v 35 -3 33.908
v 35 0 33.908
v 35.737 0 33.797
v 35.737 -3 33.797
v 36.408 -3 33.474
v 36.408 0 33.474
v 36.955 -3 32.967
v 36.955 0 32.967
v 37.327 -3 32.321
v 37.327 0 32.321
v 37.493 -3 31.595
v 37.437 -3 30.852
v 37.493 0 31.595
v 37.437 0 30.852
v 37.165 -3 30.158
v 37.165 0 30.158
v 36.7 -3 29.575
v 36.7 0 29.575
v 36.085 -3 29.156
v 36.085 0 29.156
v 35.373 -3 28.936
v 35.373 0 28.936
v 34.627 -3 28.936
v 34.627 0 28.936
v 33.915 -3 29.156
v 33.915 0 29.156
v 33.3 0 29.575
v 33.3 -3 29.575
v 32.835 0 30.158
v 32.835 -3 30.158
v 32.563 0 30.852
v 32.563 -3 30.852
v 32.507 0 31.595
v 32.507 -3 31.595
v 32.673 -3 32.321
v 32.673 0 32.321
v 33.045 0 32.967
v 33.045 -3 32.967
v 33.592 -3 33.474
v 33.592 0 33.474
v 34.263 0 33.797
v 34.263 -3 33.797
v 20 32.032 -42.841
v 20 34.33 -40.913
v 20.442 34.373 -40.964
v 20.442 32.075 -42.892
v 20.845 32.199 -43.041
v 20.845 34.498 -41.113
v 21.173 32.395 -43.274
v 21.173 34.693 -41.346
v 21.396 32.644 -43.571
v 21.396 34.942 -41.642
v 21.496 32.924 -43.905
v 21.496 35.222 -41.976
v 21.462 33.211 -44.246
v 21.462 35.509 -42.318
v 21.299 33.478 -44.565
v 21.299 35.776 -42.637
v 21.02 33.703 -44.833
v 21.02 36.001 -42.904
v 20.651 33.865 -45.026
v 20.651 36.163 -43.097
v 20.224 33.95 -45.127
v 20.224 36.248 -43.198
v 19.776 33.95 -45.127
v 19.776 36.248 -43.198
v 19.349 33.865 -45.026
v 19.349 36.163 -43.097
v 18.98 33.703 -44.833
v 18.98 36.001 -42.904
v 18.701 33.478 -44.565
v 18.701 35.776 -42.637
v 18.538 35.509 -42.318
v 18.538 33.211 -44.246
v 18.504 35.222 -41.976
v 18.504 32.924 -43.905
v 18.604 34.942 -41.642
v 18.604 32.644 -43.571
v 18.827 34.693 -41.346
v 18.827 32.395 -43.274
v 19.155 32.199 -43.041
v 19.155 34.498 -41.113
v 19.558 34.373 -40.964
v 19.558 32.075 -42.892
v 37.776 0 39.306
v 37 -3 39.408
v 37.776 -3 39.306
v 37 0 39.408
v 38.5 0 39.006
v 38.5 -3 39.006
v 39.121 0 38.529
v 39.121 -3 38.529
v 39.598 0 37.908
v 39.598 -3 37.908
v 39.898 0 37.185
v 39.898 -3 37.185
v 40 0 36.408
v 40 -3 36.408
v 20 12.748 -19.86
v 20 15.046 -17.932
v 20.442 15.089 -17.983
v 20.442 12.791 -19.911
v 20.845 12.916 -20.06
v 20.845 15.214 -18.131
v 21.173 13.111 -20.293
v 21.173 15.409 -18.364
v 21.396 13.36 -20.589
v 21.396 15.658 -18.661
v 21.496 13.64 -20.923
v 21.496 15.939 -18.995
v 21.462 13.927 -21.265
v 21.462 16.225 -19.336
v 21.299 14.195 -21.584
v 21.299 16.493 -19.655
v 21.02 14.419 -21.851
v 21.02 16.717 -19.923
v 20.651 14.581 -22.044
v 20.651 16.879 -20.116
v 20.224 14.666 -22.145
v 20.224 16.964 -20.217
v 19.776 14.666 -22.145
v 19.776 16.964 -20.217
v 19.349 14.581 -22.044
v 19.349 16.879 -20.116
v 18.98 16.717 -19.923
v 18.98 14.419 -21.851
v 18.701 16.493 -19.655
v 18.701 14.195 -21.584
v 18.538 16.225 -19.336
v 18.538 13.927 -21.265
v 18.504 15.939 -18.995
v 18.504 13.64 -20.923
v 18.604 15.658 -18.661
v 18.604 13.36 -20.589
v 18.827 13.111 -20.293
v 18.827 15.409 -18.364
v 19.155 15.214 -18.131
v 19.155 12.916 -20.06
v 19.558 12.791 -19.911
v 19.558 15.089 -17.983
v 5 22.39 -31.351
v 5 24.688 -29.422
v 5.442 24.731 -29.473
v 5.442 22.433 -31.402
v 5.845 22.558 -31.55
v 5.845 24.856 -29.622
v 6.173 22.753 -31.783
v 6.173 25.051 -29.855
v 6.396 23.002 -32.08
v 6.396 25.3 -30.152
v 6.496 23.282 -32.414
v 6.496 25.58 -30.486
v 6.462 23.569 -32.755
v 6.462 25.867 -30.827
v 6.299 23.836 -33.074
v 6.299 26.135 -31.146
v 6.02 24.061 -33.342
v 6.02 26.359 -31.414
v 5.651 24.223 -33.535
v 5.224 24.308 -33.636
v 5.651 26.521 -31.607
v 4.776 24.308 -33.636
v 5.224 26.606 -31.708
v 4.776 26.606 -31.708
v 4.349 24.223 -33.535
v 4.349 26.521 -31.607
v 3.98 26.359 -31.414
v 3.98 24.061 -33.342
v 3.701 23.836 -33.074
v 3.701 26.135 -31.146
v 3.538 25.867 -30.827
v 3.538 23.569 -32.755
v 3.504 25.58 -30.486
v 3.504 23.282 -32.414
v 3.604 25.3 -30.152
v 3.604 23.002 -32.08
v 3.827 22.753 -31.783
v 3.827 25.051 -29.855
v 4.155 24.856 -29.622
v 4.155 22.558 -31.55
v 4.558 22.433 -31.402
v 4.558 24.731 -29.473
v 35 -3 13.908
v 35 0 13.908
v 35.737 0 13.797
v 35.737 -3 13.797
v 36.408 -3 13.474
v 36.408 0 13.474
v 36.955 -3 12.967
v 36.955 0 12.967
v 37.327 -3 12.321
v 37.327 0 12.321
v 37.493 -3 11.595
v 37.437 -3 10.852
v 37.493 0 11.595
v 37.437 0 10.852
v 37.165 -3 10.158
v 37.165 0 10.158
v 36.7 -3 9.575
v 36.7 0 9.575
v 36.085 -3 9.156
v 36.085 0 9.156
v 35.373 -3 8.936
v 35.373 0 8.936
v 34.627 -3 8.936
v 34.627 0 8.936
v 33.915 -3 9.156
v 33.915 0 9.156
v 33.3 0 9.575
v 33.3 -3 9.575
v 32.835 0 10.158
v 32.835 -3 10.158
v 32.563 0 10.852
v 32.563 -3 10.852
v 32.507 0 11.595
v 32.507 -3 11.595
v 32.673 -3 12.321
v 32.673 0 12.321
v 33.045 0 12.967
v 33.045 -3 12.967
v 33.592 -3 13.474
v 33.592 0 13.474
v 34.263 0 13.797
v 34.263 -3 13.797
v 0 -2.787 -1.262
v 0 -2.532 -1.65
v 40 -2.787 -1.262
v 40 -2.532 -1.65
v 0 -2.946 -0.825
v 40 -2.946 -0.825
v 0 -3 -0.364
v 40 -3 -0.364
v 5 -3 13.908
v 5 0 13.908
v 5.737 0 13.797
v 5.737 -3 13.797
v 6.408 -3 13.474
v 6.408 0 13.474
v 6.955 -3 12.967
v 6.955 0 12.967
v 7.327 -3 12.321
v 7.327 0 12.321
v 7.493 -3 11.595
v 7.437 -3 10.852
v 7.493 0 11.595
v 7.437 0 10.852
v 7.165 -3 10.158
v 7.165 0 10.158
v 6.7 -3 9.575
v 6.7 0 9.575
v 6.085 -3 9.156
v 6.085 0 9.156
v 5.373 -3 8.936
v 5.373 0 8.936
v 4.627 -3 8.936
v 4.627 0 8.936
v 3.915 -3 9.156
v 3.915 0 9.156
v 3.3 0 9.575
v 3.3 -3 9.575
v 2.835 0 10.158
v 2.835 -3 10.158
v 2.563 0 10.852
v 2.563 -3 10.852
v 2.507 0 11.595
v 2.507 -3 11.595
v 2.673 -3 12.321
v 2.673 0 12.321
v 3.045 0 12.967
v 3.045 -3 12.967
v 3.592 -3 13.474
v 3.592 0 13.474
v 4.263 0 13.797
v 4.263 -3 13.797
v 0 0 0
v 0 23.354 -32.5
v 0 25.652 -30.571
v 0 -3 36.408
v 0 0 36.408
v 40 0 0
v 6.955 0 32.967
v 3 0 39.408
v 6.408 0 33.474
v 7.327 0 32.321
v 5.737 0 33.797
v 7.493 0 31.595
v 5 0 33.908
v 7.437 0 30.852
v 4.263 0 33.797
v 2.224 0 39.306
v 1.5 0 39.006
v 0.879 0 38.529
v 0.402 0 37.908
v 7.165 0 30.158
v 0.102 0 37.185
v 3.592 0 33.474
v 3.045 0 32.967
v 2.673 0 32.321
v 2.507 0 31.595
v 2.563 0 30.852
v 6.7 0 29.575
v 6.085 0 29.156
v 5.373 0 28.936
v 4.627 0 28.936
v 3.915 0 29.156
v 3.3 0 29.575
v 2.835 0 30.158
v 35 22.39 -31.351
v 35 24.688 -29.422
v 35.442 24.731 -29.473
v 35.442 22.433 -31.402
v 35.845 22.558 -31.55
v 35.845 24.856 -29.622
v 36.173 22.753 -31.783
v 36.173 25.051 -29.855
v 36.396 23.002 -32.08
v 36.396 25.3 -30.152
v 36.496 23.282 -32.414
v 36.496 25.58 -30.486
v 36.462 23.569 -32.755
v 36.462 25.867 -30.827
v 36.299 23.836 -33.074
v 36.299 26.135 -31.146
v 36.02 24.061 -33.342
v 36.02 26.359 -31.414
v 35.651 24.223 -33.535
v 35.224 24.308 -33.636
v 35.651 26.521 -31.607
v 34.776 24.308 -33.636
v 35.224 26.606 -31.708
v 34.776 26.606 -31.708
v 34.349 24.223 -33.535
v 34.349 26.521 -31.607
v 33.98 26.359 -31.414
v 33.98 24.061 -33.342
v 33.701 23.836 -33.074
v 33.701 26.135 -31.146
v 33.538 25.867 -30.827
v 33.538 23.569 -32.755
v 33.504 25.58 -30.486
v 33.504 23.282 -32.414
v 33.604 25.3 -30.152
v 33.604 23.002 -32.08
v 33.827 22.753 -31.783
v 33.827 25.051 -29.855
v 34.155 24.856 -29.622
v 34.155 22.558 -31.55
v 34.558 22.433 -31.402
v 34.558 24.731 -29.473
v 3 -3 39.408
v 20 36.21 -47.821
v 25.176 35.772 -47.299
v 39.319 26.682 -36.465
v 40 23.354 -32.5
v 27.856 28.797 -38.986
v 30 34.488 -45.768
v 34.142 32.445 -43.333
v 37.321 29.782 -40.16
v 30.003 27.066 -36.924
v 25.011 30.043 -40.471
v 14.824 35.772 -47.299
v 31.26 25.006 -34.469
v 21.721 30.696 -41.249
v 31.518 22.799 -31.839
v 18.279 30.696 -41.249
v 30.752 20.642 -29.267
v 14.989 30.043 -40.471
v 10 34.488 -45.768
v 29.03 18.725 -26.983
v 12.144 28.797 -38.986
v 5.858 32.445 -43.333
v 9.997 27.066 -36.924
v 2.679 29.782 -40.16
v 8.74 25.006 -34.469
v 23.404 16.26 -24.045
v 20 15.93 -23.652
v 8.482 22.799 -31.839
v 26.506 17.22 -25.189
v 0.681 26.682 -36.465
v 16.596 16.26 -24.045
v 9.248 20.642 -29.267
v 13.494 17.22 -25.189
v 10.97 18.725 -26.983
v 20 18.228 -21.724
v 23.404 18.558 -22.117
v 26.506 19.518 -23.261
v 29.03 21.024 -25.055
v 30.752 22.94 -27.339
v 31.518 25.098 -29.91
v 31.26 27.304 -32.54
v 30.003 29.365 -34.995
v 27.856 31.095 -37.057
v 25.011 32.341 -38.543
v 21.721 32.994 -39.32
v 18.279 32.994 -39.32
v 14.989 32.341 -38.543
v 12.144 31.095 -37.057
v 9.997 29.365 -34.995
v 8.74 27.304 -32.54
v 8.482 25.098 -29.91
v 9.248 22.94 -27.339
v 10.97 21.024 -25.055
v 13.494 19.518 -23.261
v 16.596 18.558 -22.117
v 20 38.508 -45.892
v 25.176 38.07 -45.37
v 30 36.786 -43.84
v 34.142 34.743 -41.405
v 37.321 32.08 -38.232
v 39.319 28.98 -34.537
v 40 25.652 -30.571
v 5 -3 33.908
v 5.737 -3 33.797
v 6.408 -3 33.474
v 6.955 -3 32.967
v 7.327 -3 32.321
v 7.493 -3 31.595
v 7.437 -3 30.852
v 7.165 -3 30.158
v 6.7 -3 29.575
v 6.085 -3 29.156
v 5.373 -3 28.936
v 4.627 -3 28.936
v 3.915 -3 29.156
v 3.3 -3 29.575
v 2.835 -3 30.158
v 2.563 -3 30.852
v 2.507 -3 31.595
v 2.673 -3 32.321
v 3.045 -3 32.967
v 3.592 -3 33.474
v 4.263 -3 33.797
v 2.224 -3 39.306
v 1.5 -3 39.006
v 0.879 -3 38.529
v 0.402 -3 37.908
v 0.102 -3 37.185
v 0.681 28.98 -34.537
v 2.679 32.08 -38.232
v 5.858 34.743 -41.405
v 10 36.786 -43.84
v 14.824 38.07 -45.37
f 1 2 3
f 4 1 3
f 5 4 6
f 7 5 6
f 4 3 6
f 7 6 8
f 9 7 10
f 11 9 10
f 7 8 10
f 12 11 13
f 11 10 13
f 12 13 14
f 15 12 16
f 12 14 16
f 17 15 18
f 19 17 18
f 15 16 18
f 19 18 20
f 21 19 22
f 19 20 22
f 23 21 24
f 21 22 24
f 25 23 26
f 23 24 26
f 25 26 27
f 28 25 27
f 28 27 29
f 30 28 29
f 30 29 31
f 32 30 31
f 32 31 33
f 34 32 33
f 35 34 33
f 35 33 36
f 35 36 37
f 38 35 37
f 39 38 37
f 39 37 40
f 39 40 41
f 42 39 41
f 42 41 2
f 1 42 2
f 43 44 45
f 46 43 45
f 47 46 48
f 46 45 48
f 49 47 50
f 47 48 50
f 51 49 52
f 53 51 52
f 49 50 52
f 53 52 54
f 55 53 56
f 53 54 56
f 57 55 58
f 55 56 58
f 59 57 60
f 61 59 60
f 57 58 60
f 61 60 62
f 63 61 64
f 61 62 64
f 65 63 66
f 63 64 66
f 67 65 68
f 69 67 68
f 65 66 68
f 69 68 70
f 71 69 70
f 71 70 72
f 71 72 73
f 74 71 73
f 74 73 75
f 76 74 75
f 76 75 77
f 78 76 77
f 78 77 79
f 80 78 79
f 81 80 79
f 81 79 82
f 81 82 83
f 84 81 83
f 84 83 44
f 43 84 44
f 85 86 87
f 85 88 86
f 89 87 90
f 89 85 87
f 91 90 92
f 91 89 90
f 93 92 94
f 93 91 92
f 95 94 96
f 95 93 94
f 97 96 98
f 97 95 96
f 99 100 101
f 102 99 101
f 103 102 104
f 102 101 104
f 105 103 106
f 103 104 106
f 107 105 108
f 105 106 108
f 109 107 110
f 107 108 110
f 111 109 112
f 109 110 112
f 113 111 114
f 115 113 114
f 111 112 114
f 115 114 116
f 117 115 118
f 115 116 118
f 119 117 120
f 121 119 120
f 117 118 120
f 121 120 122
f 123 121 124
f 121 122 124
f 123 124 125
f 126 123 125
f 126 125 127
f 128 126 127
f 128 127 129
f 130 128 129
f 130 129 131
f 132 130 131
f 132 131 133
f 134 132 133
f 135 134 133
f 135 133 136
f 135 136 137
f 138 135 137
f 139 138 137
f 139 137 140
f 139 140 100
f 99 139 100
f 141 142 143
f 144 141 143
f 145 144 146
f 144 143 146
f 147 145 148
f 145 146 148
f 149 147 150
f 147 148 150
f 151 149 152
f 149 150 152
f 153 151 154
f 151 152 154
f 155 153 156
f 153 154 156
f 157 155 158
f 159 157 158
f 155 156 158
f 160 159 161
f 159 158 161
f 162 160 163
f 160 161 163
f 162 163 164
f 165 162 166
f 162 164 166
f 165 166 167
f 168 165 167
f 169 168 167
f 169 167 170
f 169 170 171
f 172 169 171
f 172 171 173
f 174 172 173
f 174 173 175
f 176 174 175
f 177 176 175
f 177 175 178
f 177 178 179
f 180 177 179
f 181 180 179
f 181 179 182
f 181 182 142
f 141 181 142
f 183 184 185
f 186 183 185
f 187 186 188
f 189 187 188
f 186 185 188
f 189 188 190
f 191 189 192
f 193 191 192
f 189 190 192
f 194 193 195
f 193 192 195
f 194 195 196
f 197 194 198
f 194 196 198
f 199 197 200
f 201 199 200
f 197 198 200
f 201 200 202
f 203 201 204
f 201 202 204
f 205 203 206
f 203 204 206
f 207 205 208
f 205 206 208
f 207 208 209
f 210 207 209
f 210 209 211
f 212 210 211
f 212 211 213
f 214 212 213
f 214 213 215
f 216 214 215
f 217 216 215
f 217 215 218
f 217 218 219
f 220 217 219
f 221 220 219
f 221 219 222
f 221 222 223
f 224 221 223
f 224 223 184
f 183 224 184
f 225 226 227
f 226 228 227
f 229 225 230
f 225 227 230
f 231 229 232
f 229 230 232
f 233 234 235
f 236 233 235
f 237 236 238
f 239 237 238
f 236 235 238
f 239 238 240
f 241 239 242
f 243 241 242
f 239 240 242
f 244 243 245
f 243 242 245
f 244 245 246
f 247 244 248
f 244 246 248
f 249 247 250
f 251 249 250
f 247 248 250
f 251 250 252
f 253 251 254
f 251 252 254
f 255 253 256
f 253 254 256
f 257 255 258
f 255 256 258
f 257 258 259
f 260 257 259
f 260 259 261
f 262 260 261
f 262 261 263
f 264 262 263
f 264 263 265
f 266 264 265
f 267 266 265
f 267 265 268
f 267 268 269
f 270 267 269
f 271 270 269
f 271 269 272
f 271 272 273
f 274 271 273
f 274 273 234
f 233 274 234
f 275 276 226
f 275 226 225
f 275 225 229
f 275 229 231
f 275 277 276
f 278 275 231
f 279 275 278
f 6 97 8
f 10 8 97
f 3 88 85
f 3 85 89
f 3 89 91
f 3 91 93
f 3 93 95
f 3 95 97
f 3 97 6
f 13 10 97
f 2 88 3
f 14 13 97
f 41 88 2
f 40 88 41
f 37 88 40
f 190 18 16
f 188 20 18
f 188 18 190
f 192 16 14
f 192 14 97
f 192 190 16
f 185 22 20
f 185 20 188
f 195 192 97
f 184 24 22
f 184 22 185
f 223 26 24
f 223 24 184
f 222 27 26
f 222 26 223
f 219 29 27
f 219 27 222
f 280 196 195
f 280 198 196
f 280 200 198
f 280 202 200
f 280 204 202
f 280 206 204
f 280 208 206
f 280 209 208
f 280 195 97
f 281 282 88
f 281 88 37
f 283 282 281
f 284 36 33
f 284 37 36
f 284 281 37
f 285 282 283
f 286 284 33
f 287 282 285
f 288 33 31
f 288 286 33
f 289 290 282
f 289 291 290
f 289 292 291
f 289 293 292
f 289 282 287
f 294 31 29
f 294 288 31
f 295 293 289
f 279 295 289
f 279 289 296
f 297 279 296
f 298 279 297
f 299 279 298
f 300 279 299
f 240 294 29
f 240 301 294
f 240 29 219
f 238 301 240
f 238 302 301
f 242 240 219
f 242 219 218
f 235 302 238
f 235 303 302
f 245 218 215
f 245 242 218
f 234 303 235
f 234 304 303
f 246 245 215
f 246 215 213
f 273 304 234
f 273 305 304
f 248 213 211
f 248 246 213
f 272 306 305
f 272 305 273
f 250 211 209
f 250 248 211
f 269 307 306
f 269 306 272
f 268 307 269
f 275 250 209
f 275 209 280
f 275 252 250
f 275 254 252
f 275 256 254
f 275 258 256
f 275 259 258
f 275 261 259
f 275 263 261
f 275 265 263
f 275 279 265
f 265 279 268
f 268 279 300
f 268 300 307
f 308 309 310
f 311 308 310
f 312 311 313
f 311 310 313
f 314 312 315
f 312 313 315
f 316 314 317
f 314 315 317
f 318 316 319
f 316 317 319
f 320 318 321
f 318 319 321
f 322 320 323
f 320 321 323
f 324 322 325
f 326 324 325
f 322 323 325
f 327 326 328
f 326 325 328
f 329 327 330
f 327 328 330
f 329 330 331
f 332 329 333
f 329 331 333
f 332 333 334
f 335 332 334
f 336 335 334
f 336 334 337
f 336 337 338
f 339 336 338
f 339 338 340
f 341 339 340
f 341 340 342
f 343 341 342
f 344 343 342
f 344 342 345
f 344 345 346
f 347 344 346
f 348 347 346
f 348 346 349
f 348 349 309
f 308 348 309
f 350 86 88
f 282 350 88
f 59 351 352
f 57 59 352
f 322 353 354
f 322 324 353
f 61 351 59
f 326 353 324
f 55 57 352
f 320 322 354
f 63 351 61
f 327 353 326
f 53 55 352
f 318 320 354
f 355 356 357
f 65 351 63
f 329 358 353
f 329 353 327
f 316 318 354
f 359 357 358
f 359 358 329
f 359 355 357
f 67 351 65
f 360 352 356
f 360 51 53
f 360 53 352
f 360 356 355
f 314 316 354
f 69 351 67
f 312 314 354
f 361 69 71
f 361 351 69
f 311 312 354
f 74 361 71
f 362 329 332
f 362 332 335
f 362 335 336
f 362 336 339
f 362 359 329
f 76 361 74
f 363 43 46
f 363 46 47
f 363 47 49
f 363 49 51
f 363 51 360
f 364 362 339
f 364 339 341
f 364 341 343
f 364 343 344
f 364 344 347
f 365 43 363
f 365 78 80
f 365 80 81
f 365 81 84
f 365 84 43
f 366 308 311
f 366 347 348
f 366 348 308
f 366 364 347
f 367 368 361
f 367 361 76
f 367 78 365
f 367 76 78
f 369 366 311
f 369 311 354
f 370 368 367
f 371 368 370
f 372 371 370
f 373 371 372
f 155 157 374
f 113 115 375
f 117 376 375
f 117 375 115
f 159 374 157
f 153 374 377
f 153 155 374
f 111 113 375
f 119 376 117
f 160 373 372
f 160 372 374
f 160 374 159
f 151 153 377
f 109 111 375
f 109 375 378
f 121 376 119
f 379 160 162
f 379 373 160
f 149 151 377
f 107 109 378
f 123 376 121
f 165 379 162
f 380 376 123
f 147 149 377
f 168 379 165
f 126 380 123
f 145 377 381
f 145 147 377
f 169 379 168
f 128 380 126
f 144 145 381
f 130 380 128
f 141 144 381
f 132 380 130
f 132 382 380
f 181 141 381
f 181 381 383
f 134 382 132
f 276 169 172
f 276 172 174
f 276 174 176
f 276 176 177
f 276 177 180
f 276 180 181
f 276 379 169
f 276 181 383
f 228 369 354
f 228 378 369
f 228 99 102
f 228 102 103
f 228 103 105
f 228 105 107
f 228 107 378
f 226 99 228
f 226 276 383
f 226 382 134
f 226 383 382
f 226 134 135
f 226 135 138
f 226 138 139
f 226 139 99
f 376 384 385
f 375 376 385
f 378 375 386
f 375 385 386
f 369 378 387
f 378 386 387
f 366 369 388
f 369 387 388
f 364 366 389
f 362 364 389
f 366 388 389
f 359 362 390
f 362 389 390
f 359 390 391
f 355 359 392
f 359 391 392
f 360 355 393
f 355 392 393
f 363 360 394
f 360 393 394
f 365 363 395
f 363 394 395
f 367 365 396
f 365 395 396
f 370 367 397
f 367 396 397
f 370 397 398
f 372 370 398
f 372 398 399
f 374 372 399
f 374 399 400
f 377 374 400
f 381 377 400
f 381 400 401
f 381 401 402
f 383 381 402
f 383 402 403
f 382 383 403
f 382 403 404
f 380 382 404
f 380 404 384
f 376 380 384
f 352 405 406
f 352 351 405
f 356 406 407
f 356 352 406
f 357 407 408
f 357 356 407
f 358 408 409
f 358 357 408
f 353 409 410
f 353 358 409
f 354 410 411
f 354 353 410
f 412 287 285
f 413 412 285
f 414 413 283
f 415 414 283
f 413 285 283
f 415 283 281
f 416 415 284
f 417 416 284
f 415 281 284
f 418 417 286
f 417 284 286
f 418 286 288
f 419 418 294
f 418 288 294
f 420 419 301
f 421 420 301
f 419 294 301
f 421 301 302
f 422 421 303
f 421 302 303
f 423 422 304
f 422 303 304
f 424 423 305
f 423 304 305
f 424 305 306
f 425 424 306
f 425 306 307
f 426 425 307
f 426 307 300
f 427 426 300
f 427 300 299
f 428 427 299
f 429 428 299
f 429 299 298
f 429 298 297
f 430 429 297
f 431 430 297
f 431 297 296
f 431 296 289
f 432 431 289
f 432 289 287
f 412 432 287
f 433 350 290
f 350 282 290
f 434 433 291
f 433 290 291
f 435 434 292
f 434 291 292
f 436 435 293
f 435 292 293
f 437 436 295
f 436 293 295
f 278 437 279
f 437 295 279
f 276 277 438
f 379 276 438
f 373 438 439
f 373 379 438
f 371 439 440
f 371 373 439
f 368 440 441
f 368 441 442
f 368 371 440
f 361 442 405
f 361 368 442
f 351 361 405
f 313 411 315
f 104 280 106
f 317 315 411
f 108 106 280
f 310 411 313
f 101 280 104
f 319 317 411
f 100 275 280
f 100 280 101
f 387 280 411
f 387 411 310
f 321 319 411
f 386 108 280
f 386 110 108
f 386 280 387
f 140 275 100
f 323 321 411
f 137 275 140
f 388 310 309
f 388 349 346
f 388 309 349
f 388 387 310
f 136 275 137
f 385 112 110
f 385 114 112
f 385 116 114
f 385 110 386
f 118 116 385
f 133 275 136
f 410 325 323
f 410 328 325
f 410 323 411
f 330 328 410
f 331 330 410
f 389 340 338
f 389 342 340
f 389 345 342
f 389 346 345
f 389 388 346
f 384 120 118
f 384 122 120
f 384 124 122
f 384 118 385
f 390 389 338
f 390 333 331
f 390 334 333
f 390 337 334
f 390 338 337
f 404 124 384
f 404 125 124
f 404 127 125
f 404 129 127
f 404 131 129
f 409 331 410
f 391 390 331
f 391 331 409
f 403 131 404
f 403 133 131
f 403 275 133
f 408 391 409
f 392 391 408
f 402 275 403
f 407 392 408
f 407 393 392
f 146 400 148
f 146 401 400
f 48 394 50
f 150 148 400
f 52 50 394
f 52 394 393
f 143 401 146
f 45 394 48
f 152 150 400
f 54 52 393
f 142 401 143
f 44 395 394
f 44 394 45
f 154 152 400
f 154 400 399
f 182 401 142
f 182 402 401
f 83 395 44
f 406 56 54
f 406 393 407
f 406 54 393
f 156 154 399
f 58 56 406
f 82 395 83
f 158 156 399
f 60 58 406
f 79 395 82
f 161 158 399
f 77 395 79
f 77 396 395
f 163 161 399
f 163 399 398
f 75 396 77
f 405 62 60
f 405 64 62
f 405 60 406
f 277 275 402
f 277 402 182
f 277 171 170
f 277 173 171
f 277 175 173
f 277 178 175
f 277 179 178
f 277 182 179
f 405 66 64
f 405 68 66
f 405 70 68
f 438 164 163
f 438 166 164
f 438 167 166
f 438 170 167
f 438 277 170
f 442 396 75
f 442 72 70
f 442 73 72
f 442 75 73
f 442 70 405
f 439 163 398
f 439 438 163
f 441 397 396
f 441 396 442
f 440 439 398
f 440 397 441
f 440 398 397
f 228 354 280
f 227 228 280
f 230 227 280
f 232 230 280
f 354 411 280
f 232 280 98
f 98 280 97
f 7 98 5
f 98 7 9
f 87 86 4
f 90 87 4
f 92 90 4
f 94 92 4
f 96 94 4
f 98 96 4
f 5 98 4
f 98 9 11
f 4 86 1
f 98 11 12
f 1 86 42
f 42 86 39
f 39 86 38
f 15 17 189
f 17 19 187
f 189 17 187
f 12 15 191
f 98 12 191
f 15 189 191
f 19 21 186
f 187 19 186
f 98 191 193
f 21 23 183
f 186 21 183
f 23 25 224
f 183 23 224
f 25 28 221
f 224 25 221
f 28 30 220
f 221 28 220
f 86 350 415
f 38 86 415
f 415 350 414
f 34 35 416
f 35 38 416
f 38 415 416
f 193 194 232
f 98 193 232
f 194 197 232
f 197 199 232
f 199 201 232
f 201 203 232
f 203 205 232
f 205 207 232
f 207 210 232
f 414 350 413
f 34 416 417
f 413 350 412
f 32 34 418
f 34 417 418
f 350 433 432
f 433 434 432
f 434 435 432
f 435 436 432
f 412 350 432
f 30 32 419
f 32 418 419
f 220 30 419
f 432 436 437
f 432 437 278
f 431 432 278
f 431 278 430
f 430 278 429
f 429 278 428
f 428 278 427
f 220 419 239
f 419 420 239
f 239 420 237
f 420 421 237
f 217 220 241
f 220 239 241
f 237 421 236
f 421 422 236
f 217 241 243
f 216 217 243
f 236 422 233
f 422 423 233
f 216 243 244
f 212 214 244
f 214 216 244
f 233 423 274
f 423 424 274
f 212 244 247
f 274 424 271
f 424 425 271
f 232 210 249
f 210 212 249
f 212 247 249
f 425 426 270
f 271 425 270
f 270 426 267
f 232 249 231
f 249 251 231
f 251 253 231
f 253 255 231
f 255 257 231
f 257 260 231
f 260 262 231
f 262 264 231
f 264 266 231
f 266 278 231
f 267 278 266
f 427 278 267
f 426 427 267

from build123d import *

# Parameters (mm, degrees)
EXTRUDE_1_DEPTH     = 40
SKETCH_3_R          = 2.5
SKETCH_3_R_2        = 2.499999999
CUT_EXTRUDE_1_DEPTH = 40
FILLET_1_R          = 3
FILLET_2_R          = 3
FILLET_3_R          = 20
FILLET_4_R          = 20
SKETCH_4_R          = 11.55
SKETCH_4_R_2        = 1.5
CUT_EXTRUDE_2_DEPTH = 40
FILLET_5_R          = 2


with BuildPart() as part:
    # 草图1 → 凸台-拉伸1 (new body)
    with BuildSketch(Plane(origin=(0, 0, 0), x_dir=(0, 0, -1), z_dir=(1, 0, 0))):
        Polygon((-39.408089297, 0), (0, 0), (45.892258904, 38.50817752), (47.820621733, 36.210044191), (1.091910703, -3), (0.178974486, -3), (-39.408089297, -3), align=None)
    extrude(amount=EXTRUDE_1_DEPTH)

    # 草图3 → 切除-拉伸1 (cut)
    with BuildSketch(Plane(origin=(0, 0, 0), x_dir=(1, 0, 0), z_dir=(0, 1, 0))):
        with Locations(Location((5, -31.408089297, 0), (0, 0, 270))):
            Circle(SKETCH_3_R)
        with Locations(Location((5, -11.408089297, 0), (0, 0, 270))):
            Circle(SKETCH_3_R_2)
        with Locations(Location((35, -11.408089297, 0), (0, 0, 270))):
            Circle(SKETCH_3_R_2)
        with Locations(Location((35, -31.408089297, 0), (0, 0, 270))):
            Circle(SKETCH_3_R)
    extrude(amount=-CUT_EXTRUDE_1_DEPTH, mode=Mode.SUBTRACT)

    # 圆角1
    fillet_1_edges = [part.edges().sort_by_distance(p)[0] for p in [
        (40, -1.5, 39.408089297),
    ]]
    fillet(fillet_1_edges, radius=FILLET_1_R)

    # 圆角2
    fillet_2_edges = [part.edges().sort_by_distance(p)[0] for p in [
        (0, -1.5, 39.408089297),
    ]]
    fillet(fillet_2_edges, radius=FILLET_2_R)

    # 圆角3
    fillet_3_edges = [part.edges().sort_by_distance(p)[0] for p in [
        (0, 37.359110856, -46.856440319),
    ]]
    fillet(fillet_3_edges, radius=FILLET_3_R)

    # 圆角4
    fillet_4_edges = [part.edges().sort_by_distance(p)[0] for p in [
        (40, 37.359110856, -46.856440319),
    ]]
    fillet(fillet_4_edges, radius=FILLET_4_R - 0.0001)  # a hair under: the kernel refuses the full size

    # 草图4 → 切除-拉伸2 (cut)
    with BuildSketch(Plane(origin=(0, 0, 0), x_dir=(1, 0, 0), z_dir=(0, 0.7660444431189773, 0.6427876096865403))):
        with Locations(Location((20, 39.908089297, 0), (0, 0, 270))):
            Circle(SKETCH_4_R)
        with Locations(Location((20, 54.908089297, 0), (0, 0, 270))):
            Circle(SKETCH_4_R_2)
        with Locations(Location((35, 39.908089297, 0), (0, 0, 270))):
            Circle(SKETCH_4_R_2)
        with Locations(Location((5, 39.908089297, 0), (0, 0, 270))):
            Circle(SKETCH_4_R_2)
        with Locations(Location((20, 24.908089297, 0), (0, 0, 270))):
            Circle(SKETCH_4_R_2)
    extrude(amount=-CUT_EXTRUDE_2_DEPTH, mode=Mode.SUBTRACT)

    # 圆角5
    fillet_5_edges = [part.edges().sort_by_distance(p)[0] for p in [
        (20, -3, -1.091910703),
    ]]
    fillet(fillet_5_edges, radius=FILLET_5_R)


solid = part.part
